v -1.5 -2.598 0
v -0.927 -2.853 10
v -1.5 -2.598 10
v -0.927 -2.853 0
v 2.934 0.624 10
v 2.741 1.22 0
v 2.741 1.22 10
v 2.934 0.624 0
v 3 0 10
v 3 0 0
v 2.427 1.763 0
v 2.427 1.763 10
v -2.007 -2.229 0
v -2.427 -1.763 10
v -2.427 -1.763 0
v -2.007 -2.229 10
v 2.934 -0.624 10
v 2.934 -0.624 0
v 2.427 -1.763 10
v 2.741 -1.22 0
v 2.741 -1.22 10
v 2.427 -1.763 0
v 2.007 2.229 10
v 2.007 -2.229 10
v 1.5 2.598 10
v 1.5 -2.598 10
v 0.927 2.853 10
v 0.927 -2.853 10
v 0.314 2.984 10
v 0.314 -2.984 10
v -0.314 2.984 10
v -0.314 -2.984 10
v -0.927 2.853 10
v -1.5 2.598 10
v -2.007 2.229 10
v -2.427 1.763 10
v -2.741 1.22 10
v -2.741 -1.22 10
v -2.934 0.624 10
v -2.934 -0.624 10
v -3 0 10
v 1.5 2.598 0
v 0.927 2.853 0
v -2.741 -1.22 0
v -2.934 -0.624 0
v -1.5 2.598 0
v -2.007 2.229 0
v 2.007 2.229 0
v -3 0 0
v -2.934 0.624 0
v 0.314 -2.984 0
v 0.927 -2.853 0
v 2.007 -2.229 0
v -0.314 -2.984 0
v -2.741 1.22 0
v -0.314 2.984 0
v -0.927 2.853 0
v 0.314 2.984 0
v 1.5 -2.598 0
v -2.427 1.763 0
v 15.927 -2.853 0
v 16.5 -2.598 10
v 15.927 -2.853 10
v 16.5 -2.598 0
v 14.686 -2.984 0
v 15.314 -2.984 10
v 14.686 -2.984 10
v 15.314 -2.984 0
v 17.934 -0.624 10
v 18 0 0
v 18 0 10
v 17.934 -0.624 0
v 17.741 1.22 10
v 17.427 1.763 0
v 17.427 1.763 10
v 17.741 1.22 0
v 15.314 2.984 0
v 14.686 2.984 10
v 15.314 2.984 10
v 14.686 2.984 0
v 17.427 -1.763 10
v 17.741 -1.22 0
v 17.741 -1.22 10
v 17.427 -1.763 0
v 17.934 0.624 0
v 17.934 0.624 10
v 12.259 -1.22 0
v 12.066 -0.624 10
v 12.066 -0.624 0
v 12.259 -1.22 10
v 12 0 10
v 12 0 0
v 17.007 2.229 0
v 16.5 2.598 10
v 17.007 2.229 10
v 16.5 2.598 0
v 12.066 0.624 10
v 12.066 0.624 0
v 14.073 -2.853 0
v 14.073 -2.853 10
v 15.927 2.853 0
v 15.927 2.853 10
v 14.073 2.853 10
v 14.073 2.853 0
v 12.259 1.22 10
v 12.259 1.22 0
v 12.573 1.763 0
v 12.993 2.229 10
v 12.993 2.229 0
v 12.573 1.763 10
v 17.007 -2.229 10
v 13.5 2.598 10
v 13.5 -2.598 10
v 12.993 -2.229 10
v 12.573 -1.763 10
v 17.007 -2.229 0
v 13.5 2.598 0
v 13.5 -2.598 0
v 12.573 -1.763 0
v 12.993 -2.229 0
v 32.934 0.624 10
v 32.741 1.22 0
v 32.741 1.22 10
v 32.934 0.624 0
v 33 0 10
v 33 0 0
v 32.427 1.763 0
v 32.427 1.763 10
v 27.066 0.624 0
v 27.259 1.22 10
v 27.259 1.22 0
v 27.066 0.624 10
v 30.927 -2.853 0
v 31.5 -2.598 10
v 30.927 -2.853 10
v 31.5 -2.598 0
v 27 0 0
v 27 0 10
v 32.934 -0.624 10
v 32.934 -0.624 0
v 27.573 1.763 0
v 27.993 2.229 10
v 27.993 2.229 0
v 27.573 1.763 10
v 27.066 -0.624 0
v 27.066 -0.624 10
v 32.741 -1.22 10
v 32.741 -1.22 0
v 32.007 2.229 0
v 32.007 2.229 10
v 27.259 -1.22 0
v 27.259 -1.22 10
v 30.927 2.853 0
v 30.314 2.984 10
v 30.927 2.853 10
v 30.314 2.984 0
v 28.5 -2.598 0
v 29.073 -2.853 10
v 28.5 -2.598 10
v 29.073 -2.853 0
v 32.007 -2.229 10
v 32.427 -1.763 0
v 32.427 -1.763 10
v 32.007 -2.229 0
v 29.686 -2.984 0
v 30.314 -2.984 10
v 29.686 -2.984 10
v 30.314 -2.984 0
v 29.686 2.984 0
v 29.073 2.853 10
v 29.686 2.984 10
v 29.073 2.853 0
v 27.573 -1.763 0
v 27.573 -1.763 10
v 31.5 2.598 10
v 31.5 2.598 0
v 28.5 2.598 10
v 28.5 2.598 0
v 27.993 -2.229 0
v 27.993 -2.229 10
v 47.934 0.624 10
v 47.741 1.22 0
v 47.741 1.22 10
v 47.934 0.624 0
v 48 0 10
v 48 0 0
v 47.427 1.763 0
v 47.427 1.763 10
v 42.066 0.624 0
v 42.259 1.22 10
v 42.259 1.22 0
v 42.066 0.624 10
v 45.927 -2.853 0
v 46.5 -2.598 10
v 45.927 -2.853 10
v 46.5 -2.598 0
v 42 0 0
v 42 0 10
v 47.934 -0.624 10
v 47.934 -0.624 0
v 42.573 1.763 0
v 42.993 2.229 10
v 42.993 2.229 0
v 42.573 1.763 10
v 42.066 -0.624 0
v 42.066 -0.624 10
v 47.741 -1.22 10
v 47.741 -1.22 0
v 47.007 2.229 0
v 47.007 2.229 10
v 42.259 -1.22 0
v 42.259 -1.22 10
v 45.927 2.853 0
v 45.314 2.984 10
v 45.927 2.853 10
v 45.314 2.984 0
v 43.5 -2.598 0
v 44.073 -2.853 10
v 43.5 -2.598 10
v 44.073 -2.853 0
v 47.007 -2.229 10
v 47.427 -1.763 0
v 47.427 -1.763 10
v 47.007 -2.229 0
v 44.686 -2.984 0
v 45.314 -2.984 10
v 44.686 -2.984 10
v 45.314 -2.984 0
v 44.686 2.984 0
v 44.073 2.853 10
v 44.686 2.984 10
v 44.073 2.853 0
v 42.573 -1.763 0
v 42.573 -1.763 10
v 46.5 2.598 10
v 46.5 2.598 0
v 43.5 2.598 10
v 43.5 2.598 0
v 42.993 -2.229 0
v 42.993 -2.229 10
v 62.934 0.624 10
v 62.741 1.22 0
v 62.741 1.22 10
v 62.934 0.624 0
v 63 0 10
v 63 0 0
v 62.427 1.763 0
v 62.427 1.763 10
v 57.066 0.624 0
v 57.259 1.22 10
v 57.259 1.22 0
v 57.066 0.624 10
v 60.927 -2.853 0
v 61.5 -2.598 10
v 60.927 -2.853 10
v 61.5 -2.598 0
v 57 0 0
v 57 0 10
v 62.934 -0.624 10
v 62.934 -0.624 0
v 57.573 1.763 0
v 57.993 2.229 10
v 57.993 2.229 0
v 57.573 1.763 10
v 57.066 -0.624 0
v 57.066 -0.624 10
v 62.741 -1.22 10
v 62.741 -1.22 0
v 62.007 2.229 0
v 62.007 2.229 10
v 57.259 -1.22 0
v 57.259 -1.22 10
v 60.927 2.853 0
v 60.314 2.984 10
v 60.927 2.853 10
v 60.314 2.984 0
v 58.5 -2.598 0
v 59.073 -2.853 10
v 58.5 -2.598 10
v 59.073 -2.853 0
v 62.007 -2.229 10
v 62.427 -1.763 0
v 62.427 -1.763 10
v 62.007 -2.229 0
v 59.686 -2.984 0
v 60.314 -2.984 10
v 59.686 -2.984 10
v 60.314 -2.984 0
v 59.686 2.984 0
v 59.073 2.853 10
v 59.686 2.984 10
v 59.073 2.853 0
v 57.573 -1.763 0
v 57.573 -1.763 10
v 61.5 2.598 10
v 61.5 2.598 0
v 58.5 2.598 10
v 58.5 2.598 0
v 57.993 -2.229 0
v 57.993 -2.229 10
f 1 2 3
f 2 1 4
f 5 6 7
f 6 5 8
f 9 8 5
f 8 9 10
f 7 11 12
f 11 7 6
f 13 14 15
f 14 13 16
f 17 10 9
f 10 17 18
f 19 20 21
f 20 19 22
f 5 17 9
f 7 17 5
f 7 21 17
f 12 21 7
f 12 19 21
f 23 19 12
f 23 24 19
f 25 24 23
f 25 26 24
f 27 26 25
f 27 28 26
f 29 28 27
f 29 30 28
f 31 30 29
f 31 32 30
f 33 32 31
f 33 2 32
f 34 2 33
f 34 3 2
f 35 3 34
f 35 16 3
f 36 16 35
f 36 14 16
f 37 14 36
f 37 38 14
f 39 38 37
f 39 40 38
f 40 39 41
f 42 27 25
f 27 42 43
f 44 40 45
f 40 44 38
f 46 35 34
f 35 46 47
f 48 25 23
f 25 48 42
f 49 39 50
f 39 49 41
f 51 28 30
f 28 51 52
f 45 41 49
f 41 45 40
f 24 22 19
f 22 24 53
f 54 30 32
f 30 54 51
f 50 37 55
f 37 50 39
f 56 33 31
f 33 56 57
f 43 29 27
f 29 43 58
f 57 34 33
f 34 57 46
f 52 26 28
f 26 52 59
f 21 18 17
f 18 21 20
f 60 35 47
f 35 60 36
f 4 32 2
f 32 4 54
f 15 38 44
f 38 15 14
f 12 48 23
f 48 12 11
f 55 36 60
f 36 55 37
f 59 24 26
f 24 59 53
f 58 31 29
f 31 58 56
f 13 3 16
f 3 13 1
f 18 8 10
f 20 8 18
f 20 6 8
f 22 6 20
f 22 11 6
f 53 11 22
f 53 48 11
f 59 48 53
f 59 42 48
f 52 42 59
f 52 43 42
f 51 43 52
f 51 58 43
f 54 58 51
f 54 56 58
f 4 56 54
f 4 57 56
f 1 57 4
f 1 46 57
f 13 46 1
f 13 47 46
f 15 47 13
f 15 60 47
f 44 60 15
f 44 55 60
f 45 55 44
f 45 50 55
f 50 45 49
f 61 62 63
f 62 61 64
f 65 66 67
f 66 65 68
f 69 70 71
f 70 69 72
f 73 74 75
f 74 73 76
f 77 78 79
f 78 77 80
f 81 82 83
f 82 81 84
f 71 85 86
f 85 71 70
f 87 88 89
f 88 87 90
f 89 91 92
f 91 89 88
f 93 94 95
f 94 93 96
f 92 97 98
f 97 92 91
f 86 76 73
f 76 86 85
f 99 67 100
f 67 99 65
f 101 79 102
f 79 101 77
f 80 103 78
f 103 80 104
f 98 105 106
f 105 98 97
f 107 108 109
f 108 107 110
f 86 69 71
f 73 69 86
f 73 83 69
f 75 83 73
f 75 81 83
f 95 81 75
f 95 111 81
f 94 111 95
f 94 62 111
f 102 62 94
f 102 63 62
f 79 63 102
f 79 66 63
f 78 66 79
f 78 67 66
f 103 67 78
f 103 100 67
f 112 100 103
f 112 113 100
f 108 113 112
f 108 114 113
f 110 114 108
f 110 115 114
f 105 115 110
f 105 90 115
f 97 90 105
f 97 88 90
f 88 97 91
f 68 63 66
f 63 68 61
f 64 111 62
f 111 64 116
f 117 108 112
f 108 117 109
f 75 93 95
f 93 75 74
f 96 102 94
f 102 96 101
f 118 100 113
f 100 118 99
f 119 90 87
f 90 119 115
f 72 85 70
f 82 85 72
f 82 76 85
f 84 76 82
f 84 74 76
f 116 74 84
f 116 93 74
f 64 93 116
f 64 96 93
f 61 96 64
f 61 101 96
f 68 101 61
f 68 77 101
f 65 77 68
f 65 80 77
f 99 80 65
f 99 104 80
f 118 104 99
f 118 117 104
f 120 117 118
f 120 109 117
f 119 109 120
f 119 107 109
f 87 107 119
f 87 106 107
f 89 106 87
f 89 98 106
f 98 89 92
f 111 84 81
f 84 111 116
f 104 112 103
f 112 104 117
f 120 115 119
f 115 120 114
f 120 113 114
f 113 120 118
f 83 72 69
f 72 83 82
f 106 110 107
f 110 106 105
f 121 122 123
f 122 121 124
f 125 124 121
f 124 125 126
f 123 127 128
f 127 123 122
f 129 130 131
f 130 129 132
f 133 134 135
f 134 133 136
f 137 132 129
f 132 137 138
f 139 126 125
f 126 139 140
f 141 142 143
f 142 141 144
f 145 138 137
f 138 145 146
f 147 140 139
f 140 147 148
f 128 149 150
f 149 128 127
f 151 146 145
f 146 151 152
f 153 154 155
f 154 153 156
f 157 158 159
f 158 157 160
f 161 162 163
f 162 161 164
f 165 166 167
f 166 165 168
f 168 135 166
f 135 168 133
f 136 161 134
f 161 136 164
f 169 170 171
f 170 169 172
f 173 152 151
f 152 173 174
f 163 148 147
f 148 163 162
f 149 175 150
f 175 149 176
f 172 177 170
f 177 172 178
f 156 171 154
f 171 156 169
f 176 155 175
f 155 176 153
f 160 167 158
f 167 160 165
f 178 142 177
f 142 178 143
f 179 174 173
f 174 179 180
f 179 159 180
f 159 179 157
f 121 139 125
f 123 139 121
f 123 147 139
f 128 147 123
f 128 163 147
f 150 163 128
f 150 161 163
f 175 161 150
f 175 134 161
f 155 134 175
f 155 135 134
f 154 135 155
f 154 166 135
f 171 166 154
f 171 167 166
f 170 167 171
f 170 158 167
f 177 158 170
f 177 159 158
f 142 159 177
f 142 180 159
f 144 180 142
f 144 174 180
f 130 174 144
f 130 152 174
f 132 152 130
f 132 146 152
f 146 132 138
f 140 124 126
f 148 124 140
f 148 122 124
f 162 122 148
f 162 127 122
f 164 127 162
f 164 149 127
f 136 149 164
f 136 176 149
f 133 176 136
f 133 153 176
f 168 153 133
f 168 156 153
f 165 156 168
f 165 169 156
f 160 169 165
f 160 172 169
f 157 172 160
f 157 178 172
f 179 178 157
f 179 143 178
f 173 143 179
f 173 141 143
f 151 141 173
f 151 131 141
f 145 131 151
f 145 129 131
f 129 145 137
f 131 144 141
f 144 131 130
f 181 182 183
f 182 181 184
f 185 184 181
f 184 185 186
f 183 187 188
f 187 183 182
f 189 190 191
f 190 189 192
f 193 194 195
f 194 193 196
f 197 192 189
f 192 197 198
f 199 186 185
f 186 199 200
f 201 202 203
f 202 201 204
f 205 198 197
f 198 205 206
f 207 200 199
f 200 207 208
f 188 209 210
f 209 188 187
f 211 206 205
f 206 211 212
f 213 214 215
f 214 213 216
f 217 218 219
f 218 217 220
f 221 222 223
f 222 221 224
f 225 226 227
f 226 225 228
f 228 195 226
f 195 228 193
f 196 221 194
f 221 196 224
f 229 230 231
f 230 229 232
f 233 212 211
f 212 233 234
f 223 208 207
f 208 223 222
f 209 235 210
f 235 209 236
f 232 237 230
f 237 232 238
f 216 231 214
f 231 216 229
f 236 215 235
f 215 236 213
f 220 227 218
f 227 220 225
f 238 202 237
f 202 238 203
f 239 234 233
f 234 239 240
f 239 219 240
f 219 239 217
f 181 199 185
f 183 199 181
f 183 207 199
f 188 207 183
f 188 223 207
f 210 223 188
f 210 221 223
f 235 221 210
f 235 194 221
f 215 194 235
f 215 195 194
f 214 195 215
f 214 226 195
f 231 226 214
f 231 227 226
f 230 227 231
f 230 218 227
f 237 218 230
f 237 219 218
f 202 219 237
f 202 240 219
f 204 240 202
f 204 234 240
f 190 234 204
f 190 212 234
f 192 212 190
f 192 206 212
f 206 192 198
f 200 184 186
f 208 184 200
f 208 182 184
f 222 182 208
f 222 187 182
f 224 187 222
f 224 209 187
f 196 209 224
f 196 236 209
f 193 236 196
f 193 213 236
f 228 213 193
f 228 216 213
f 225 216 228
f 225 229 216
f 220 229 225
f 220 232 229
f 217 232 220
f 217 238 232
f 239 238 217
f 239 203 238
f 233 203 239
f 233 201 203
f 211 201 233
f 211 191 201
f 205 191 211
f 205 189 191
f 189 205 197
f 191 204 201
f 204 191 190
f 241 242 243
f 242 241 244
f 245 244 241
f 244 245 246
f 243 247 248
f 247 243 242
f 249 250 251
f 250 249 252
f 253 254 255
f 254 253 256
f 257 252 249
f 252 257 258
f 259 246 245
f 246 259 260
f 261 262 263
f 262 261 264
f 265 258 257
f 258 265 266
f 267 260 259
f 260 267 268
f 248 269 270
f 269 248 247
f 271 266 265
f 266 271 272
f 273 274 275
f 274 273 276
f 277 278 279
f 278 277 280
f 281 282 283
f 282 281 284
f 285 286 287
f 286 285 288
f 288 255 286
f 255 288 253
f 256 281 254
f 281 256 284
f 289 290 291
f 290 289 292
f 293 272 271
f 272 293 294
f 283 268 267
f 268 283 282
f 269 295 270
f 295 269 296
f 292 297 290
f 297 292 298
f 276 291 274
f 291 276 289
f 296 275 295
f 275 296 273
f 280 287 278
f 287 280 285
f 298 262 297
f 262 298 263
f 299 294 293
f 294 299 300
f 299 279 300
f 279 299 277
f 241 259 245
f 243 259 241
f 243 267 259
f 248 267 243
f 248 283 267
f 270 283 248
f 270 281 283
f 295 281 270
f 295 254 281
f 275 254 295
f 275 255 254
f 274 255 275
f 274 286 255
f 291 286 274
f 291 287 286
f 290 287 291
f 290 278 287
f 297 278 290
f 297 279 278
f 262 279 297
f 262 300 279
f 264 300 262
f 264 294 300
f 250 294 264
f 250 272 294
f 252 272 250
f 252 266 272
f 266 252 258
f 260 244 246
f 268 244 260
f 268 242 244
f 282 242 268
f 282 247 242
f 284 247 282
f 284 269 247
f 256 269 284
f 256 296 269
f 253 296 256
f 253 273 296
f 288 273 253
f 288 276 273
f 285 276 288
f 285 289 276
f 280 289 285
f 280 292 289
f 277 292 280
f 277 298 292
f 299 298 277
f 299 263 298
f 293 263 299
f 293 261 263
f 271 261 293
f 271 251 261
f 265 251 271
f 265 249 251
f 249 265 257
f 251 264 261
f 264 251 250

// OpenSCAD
// Linear Pattern of Cylinders
// Repeat objects in a line using for loop

$fn = 30;
count = 5;
spacing = 15;

for(i = [0:count-1]) {
    translate([i*spacing, 0, 0])
        cylinder(h=10, r=3);
}
